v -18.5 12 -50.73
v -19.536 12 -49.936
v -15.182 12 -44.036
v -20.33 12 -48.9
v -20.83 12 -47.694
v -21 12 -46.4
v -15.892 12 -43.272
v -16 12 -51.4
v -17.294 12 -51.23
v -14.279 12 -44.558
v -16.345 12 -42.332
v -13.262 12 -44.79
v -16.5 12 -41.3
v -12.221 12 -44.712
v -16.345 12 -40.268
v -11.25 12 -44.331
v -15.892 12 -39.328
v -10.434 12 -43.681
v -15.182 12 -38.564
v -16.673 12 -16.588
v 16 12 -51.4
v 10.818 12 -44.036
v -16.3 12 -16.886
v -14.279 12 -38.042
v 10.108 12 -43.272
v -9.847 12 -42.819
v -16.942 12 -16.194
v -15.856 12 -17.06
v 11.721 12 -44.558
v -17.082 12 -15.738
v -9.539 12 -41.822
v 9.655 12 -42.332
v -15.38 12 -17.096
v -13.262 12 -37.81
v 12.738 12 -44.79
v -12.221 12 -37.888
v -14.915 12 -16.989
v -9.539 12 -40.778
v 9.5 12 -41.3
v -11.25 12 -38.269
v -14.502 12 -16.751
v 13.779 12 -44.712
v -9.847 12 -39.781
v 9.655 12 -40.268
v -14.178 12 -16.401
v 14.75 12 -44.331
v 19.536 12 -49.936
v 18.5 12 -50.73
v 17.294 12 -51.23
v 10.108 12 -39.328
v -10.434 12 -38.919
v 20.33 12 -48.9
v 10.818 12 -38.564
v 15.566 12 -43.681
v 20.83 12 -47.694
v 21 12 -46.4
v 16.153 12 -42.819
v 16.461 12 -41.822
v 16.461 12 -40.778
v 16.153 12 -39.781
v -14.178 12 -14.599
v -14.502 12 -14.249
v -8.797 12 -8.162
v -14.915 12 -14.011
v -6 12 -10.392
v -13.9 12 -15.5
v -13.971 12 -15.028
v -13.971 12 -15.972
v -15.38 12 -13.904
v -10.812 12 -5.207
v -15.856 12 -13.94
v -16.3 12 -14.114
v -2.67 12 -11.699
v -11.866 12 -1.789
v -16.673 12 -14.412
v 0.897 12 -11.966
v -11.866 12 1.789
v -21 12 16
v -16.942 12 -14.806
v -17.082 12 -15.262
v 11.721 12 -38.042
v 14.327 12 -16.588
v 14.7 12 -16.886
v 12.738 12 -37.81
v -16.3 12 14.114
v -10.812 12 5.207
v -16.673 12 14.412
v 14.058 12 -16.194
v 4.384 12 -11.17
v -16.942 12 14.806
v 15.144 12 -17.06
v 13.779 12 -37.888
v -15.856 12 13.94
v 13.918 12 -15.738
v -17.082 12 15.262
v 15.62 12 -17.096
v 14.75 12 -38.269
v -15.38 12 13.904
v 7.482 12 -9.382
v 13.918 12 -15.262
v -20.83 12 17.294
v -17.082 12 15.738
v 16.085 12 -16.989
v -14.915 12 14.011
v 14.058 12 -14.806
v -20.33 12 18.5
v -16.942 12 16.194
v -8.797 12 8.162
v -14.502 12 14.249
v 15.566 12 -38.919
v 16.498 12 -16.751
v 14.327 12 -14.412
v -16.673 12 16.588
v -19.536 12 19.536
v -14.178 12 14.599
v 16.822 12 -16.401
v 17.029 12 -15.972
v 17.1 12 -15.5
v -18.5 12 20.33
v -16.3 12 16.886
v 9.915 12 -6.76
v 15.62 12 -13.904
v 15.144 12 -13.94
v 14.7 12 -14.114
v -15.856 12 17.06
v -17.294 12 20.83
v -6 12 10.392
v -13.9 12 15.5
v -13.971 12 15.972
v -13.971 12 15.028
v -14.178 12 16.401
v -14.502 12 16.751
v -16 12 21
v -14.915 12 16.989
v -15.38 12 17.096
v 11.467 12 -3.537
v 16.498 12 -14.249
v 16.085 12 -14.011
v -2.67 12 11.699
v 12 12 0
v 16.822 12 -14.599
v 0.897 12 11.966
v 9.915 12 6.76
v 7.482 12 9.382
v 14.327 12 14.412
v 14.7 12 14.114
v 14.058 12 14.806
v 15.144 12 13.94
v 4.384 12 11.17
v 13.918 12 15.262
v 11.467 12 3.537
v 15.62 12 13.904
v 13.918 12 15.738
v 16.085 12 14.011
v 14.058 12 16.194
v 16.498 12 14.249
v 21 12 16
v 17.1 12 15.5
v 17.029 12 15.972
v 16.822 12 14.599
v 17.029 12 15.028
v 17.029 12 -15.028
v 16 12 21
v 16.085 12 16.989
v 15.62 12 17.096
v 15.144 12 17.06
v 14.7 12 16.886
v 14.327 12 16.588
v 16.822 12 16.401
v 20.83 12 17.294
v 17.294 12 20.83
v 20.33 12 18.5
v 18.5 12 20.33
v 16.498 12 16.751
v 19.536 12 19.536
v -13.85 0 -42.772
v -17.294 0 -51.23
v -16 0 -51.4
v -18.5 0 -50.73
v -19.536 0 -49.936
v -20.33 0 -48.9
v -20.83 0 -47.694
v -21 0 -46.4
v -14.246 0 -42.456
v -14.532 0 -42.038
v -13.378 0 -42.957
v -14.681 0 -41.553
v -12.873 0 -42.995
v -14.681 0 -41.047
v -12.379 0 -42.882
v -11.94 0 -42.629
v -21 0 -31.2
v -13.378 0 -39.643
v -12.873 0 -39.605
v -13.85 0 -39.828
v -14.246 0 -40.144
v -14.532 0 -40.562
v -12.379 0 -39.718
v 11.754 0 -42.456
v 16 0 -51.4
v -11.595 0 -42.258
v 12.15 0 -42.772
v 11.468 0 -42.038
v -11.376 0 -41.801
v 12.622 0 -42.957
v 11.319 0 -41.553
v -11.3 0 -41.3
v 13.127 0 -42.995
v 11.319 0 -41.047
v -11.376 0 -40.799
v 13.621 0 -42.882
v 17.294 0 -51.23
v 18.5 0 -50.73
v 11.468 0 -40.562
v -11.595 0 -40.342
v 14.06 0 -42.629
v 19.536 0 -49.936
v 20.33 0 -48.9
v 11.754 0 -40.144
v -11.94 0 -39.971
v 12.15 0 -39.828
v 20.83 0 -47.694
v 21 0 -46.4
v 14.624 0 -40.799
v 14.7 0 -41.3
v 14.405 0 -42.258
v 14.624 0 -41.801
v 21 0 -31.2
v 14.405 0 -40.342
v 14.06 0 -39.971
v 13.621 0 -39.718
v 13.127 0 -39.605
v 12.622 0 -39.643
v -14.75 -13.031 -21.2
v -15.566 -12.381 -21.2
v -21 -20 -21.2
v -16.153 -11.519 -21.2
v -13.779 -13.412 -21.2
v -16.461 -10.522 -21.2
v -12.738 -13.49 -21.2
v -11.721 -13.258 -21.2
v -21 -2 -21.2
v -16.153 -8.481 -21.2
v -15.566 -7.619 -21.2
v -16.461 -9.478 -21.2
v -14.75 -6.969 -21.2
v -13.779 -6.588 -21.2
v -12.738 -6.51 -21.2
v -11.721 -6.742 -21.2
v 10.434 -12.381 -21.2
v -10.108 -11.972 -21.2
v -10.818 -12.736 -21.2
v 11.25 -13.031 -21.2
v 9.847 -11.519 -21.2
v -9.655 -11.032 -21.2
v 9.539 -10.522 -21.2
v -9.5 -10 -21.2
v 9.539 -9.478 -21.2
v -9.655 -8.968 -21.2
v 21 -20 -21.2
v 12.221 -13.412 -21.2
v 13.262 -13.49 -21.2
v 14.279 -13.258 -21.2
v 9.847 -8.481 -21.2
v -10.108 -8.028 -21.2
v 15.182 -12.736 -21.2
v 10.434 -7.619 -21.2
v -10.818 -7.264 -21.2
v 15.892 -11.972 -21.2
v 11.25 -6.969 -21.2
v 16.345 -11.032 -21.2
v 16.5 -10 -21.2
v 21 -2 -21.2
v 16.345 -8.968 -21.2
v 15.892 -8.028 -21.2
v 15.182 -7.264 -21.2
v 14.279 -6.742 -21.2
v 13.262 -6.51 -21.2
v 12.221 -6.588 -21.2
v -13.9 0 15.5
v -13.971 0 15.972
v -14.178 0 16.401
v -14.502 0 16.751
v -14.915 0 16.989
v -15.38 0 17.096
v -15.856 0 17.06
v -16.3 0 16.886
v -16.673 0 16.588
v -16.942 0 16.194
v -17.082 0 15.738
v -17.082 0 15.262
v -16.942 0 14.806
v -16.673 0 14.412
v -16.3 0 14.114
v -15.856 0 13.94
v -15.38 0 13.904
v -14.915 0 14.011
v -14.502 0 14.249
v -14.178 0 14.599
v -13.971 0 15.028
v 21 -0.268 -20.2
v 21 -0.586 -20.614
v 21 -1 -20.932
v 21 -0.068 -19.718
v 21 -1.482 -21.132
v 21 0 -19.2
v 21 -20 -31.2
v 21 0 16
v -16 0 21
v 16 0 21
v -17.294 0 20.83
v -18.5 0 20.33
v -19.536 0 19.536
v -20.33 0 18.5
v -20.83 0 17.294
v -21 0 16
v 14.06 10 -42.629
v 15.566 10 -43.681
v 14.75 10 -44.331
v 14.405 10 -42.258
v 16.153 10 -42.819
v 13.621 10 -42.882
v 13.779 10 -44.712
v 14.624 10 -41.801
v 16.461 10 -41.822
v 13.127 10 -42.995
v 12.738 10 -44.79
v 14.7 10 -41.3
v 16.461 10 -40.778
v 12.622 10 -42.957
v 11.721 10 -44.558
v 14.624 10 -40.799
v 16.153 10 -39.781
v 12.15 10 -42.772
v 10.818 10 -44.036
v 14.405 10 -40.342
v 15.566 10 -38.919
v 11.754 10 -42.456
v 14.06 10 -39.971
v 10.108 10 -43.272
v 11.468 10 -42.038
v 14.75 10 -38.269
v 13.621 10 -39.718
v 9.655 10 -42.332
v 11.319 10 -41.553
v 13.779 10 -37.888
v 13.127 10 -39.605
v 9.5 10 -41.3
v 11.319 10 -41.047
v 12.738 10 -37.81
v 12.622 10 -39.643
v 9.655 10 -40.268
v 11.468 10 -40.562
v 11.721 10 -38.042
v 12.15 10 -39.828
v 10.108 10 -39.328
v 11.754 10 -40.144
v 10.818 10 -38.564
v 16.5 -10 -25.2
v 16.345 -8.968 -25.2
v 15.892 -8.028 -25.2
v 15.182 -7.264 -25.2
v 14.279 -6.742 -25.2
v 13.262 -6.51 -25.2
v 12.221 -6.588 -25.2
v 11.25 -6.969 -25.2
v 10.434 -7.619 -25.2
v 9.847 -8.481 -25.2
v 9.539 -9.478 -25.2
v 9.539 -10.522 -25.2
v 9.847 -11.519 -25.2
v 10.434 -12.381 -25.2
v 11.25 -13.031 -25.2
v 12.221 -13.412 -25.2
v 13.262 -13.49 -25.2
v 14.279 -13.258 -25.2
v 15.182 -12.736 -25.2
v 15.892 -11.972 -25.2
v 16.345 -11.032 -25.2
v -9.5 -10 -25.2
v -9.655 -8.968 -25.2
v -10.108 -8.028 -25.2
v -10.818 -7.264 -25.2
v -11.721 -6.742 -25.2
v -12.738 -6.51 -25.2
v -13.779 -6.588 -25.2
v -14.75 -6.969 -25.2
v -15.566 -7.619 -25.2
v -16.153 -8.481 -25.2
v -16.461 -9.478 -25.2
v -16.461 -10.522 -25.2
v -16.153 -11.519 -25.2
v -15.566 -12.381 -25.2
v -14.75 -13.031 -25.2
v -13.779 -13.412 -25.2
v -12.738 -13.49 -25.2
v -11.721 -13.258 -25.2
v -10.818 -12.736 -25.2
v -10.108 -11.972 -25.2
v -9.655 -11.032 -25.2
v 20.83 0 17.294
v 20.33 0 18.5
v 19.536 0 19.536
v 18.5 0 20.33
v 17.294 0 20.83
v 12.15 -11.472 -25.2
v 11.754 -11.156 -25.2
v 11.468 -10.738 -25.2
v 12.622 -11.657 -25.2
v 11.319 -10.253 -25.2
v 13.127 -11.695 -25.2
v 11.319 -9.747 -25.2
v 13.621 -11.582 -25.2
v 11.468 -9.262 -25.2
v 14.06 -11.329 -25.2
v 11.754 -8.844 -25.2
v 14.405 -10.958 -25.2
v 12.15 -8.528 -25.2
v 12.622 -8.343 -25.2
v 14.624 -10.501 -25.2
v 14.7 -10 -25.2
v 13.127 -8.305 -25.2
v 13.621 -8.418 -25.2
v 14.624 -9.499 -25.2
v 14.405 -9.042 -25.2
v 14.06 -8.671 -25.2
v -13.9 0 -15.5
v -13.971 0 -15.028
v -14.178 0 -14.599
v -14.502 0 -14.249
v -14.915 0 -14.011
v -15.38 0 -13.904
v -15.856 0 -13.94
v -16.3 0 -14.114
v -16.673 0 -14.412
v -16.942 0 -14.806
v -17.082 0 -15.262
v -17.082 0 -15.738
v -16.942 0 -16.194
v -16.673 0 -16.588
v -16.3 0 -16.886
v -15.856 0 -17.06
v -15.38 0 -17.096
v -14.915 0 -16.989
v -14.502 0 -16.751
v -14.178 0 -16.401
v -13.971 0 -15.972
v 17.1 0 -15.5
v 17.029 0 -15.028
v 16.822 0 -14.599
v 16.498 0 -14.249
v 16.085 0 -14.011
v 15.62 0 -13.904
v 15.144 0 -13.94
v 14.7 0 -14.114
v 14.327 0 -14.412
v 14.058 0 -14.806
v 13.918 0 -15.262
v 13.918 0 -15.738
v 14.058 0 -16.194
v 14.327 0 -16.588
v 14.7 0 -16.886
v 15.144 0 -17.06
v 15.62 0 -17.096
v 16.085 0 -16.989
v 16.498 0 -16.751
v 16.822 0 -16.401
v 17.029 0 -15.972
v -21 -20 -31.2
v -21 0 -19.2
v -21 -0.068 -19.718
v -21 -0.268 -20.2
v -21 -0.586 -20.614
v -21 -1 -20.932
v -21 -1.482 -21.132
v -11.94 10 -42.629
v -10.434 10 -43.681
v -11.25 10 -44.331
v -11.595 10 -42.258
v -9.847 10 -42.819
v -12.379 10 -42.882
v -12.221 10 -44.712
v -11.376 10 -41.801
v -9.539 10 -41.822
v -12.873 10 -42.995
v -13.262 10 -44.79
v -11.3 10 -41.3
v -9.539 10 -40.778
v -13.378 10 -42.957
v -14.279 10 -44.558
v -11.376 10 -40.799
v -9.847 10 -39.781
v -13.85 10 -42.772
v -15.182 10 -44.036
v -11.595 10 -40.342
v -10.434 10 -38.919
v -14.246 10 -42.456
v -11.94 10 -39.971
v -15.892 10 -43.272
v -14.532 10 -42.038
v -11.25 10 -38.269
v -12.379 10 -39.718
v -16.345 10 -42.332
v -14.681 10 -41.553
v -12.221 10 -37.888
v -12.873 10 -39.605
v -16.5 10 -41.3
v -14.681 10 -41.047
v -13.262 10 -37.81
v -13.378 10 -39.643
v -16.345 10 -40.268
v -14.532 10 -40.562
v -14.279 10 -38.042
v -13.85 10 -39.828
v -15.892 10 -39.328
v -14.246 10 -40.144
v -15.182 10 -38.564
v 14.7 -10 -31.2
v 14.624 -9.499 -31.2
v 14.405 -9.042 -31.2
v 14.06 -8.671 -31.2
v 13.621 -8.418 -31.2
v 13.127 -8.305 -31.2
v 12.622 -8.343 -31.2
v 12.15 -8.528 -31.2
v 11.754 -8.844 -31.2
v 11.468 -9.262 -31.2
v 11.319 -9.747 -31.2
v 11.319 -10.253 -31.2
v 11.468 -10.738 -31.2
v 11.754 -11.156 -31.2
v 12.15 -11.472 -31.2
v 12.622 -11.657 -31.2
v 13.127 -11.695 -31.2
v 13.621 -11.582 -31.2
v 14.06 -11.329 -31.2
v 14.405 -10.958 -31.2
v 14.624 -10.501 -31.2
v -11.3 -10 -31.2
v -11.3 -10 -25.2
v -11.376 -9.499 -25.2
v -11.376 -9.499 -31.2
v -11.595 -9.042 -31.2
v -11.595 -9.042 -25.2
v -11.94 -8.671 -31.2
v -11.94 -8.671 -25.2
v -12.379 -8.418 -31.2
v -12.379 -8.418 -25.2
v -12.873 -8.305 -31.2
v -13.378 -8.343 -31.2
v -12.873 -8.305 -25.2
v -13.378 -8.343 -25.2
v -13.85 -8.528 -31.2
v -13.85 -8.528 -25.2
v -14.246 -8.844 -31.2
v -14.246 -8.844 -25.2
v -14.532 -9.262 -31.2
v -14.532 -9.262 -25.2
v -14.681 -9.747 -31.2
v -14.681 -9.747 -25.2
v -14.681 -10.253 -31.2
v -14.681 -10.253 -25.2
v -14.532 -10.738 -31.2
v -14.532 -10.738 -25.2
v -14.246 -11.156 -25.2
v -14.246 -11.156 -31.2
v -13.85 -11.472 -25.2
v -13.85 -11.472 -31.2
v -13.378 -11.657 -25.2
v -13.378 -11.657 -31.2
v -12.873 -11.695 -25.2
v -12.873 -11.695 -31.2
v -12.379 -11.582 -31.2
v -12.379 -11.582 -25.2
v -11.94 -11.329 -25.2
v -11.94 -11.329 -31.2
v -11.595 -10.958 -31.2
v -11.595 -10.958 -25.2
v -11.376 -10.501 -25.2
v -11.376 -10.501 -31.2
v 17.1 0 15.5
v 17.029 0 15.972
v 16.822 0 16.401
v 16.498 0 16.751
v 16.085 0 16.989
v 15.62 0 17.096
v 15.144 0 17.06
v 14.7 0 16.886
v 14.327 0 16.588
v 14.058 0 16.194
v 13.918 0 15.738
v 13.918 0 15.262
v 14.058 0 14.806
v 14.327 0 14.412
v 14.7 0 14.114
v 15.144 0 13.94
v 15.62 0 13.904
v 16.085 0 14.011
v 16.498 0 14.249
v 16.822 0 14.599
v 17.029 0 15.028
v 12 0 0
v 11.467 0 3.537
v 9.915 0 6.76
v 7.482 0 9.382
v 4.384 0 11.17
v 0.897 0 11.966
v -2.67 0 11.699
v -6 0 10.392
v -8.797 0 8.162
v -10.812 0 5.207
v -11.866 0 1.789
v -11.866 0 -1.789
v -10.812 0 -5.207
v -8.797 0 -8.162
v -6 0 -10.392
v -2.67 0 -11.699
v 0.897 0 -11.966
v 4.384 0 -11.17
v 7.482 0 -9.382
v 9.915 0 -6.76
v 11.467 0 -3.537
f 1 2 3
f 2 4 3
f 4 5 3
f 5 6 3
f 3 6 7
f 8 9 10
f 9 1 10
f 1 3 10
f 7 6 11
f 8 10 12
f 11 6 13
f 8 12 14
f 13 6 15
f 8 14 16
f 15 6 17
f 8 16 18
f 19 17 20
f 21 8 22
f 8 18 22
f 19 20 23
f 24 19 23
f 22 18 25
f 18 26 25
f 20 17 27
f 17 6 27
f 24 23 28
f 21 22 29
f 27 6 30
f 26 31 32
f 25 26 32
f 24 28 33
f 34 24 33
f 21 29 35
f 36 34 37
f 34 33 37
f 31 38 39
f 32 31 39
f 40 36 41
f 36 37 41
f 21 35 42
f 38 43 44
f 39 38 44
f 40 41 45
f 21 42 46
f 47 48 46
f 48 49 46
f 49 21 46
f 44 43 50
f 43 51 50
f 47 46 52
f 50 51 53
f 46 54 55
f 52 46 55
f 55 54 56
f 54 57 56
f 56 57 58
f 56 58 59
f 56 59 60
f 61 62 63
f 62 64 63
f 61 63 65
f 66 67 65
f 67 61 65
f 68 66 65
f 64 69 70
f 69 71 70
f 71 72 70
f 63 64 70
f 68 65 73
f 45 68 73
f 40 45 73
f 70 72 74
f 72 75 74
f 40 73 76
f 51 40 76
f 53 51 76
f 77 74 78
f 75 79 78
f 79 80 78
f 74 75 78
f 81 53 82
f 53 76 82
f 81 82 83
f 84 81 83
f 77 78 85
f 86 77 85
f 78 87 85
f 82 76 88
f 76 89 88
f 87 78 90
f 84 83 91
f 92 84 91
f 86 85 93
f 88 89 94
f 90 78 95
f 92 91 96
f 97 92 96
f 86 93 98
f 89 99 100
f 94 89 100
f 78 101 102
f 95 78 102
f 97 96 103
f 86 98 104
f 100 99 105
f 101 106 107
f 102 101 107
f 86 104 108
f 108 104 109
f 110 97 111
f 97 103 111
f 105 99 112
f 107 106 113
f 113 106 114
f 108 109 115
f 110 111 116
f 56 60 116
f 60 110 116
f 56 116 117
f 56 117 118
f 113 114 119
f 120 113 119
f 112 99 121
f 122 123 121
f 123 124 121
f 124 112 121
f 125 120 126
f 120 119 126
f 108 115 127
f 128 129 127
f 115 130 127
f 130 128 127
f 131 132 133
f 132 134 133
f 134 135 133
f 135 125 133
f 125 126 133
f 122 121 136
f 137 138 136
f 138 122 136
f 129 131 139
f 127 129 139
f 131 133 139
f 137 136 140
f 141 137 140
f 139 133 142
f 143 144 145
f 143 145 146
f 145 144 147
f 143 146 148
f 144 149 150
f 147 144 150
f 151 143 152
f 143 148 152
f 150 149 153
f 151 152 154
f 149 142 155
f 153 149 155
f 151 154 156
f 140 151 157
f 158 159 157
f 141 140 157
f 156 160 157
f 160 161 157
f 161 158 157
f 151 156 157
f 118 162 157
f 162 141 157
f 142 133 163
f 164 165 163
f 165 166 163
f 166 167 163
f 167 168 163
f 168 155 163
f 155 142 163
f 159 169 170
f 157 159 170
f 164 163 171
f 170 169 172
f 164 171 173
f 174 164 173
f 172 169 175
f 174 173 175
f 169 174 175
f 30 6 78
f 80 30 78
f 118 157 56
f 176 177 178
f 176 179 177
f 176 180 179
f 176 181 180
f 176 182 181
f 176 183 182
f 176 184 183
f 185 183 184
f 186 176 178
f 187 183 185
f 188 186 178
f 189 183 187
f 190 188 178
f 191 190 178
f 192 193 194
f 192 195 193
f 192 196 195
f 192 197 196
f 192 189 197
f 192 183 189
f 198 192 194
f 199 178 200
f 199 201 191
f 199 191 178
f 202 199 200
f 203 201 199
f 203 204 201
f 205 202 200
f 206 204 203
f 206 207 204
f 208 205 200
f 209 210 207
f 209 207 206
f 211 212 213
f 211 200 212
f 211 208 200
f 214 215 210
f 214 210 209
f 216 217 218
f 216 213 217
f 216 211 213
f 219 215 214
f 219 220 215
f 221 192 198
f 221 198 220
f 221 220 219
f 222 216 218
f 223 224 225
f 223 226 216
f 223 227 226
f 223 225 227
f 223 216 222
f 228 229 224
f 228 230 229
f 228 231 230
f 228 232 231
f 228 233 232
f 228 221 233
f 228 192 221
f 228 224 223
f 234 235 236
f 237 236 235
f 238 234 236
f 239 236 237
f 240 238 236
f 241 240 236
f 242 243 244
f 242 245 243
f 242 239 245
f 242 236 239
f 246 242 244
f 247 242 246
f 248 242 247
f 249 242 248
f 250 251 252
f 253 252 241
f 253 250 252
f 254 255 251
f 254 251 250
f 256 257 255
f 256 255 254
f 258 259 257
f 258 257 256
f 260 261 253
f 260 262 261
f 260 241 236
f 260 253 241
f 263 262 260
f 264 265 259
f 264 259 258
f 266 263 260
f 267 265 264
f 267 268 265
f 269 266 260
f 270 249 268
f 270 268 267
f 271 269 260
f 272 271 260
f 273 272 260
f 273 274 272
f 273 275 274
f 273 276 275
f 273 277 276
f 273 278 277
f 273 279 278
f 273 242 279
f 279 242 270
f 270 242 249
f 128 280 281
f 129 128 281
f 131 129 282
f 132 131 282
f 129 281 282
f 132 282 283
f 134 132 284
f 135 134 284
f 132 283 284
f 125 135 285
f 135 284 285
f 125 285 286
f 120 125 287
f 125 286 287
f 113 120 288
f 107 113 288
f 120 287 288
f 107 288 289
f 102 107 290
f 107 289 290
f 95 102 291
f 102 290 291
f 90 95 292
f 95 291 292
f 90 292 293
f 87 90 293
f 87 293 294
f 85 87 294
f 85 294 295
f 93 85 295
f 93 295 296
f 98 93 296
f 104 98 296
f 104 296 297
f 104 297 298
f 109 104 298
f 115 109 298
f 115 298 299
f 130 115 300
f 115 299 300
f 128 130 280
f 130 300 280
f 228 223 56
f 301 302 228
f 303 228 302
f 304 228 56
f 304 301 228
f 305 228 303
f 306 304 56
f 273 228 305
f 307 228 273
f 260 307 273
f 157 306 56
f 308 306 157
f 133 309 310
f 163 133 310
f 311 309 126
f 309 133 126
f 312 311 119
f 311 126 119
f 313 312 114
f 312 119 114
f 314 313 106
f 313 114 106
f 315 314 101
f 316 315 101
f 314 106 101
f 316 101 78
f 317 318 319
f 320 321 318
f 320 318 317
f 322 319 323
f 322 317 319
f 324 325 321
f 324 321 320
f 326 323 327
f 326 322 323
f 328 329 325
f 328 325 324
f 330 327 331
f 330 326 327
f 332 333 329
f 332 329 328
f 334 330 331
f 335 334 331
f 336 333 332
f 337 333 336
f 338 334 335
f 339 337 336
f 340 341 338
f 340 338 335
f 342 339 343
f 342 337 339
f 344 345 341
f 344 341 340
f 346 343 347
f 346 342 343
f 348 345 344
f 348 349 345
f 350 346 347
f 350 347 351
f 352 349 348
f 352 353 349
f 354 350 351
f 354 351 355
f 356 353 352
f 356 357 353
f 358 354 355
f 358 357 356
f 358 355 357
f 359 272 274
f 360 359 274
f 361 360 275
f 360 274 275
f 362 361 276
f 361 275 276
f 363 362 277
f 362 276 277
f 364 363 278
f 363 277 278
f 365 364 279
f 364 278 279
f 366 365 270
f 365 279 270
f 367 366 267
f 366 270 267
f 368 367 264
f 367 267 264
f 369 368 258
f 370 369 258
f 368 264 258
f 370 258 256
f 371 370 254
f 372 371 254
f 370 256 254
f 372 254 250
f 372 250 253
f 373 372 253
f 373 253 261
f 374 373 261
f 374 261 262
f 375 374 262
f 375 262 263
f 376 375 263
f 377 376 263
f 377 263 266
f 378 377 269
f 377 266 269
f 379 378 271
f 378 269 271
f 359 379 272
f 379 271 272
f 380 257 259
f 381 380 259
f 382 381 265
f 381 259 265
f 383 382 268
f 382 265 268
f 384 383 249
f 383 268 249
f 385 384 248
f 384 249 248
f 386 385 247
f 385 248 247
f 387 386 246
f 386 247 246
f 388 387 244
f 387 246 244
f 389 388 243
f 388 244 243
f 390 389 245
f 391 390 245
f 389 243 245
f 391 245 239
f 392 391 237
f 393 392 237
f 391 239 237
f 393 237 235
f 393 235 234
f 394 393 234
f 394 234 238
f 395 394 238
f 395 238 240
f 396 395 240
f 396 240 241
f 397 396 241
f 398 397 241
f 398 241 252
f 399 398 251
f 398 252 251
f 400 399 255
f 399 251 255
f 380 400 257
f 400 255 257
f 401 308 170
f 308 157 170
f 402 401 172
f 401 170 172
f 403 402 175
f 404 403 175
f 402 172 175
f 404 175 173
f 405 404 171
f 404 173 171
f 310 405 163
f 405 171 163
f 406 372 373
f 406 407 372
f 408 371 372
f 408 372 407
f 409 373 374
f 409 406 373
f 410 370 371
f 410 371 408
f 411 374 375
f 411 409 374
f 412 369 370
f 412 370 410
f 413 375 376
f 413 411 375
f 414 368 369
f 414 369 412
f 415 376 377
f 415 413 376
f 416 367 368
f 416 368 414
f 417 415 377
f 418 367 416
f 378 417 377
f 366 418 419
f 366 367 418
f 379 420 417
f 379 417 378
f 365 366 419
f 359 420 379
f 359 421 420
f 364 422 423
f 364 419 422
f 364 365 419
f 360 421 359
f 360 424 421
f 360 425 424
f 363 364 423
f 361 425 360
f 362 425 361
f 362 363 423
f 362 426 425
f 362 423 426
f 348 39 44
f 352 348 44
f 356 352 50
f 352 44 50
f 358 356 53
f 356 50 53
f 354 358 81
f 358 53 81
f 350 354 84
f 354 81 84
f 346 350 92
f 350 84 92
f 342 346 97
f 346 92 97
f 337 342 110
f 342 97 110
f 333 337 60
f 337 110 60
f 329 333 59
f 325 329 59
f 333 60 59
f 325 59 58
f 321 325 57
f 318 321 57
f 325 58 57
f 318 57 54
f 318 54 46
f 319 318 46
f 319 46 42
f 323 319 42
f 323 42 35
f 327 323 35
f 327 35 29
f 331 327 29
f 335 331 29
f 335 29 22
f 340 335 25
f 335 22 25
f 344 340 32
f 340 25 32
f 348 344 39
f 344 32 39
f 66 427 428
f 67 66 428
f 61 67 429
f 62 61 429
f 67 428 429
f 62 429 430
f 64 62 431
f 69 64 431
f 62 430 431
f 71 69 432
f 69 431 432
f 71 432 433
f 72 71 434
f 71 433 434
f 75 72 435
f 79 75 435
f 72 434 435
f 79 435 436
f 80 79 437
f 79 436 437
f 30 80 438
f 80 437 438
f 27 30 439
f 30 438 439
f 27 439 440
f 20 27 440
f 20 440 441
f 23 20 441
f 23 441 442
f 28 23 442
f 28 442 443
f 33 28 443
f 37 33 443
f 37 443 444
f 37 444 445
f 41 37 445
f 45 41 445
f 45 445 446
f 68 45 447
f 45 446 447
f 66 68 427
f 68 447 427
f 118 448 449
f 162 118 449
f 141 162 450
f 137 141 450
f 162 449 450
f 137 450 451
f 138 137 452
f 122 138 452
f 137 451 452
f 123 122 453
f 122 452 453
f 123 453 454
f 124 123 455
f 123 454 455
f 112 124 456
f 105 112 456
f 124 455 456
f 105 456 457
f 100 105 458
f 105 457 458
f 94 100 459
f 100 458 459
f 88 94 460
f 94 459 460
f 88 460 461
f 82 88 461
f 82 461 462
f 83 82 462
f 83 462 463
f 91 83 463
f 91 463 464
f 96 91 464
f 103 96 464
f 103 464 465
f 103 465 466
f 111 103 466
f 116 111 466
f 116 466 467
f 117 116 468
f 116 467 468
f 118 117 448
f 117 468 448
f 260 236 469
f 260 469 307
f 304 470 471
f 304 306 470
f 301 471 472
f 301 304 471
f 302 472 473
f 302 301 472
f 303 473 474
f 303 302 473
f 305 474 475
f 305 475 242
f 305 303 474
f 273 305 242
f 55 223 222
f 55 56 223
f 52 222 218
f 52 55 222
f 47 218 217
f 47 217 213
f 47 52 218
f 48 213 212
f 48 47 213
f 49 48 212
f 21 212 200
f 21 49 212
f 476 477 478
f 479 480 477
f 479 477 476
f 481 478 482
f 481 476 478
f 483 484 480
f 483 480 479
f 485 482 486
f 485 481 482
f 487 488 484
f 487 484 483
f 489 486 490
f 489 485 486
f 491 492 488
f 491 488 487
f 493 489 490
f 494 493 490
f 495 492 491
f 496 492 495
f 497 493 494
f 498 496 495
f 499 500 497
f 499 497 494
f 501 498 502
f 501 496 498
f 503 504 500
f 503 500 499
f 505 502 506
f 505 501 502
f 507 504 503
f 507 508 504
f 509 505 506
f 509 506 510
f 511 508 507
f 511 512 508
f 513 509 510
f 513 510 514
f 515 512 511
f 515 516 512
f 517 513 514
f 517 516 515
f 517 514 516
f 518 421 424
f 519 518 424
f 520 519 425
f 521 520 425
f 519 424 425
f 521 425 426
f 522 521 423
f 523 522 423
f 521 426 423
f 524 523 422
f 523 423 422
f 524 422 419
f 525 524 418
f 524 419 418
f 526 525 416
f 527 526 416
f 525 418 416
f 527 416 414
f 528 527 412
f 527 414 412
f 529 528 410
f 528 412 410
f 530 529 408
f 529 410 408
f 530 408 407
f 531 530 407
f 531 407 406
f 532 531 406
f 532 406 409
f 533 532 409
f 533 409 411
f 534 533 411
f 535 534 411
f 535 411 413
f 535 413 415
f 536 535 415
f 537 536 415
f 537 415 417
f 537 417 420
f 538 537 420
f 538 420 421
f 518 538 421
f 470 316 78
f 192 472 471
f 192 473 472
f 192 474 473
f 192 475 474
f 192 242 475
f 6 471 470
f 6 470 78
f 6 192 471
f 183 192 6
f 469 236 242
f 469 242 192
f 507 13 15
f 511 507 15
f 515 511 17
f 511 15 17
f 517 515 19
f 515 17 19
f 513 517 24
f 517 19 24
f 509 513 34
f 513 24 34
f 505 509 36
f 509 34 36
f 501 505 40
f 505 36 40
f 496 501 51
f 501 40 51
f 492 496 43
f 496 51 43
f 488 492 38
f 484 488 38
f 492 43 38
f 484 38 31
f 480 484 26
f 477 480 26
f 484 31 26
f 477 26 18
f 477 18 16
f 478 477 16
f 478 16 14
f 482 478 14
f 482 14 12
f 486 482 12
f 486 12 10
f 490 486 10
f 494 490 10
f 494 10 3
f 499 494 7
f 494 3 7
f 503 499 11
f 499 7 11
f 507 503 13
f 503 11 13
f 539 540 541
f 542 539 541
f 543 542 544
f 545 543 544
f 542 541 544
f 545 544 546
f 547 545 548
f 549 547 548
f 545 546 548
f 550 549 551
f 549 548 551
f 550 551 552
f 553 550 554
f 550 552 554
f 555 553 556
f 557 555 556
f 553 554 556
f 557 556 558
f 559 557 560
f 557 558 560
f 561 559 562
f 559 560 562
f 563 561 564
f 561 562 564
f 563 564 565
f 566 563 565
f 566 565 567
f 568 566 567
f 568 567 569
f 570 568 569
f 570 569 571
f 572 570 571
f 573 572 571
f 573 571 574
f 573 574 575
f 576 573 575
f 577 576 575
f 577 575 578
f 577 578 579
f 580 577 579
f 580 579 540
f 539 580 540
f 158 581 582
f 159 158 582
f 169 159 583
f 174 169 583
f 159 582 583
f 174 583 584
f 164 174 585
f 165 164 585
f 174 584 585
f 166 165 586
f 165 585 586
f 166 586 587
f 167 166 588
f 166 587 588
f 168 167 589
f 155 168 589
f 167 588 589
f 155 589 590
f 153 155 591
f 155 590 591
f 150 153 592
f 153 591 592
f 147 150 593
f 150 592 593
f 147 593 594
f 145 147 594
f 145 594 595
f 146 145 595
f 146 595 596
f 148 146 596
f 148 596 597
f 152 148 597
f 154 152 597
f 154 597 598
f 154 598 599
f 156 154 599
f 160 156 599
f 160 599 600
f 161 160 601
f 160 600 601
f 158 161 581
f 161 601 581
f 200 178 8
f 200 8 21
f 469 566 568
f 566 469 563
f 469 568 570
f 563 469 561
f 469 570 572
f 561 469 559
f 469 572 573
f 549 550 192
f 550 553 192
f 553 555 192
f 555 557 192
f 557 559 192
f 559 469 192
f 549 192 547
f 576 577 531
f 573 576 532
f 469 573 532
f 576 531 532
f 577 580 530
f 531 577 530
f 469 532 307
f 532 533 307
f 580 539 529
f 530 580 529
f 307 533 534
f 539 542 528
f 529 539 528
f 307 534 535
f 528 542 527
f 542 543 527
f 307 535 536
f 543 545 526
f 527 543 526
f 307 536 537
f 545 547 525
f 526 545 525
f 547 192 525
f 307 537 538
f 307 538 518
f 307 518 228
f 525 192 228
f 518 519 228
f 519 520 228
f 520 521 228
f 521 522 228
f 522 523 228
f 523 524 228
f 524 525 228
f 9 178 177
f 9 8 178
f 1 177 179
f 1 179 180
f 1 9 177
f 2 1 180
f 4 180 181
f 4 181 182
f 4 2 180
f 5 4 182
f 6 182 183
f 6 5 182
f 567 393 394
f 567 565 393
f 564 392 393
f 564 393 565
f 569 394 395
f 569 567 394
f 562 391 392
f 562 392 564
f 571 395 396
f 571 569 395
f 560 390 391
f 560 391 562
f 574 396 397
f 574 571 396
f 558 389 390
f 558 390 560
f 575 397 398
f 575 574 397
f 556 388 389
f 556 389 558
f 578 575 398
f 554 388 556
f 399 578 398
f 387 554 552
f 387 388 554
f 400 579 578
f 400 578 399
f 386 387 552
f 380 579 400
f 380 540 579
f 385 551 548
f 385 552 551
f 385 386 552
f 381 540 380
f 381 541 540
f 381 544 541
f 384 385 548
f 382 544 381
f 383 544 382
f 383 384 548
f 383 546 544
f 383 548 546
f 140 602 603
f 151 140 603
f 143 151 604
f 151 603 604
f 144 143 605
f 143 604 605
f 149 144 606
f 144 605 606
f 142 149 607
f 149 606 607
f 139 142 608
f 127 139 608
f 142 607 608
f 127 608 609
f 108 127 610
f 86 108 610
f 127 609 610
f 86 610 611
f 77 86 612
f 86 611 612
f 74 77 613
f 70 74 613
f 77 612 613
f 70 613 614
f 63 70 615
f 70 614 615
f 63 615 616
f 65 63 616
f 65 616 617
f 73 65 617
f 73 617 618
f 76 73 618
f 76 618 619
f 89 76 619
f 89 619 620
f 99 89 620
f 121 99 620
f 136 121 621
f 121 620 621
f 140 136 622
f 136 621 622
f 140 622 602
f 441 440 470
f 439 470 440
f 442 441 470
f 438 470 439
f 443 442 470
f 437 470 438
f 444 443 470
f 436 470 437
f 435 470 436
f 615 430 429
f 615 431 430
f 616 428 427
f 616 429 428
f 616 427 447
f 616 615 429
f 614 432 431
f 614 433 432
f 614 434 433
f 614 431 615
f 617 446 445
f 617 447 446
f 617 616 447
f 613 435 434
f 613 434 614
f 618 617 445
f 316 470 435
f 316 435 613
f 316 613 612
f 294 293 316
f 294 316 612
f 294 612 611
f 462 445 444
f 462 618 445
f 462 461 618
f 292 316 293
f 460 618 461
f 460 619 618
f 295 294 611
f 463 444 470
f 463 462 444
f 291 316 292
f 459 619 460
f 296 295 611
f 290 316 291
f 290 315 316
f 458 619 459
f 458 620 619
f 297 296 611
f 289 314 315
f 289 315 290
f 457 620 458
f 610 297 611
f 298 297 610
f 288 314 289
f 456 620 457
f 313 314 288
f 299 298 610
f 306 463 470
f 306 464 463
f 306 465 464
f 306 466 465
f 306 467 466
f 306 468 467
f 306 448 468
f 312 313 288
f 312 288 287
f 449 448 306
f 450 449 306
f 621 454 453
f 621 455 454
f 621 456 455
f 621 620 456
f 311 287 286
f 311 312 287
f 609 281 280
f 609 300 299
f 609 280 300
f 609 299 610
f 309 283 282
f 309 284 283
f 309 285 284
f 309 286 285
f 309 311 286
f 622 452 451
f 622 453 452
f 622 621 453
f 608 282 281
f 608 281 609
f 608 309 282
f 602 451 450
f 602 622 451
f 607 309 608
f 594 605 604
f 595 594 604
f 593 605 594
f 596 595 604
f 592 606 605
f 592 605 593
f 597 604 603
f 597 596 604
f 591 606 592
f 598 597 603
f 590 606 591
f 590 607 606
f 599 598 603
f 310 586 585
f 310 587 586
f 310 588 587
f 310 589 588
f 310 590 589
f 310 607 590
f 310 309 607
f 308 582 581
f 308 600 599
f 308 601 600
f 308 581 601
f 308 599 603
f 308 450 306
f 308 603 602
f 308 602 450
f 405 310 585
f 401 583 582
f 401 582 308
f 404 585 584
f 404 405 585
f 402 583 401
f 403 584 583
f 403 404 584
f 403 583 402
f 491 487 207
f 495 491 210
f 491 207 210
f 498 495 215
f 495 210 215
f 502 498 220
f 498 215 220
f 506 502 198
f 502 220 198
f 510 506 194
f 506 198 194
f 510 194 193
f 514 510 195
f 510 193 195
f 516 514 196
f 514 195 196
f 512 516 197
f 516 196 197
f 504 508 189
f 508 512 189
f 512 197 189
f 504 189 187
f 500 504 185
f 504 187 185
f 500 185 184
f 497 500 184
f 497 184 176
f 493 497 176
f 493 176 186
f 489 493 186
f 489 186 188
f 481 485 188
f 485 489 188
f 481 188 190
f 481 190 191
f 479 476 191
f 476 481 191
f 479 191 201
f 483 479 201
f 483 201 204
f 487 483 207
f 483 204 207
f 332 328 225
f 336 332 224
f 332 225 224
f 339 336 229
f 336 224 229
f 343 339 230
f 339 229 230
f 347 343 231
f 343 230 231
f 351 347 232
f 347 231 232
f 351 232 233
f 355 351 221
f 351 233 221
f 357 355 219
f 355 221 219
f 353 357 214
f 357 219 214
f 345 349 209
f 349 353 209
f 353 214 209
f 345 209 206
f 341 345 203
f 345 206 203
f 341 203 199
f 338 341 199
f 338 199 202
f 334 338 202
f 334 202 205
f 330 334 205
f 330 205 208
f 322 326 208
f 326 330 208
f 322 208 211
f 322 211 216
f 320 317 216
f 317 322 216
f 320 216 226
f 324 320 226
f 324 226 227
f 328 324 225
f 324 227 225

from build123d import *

# Parameters (mm, degrees)
F0_W     = 42
F0_H     = 10
F1_DEPTH = 20
F0_H_2   = 42
F0_R     = 1.6
F0_R_2   = 12
F0_H_3   = 20.2
F0_R_3   = 3.5
F0_H_4   = 0.1999993771
F2_DEPTH = 12
F3_R     = 1.7
F4_DEPTH = 25
F3_R_2   = 3.5
F5_DEPTH = 4
F0_R_4   = 1.7
F6_DEPTH = 12
F7_R     = 3.5
F7_R_2   = 1.7
F8_DEPTH = 2
F9_R     = 5
F10_R    = 2


# Not quite as in the source:
# - a feature names something its author has since deleted; it is built from what else it names


with BuildPart() as f1:
    # F0 (on Front) → F1 (new body)
    with BuildSketch(Plane.XZ):
        with Locations((0, -26.1999993771)):
            Rectangle(F0_W, F0_H)
    extrude(amount=F1_DEPTH)

    # F0 (on Front) → F2 (join)
    with BuildSketch(Plane.XZ):
        Rectangle(F0_W, F0_H_2)
        with Locations((-15.5, -15.5)):
            Circle(F0_R, mode=Mode.SUBTRACT)
        with Locations((15.5, -15.5)):
            Circle(F0_R, mode=Mode.SUBTRACT)
        with Locations((-15.5, 15.5)):
            Circle(F0_R, mode=Mode.SUBTRACT)
        Circle(F0_R_2, mode=Mode.SUBTRACT)
        with Locations((15.5, 15.5)):
            Circle(F0_R, mode=Mode.SUBTRACT)
        with Locations((0, -26.1999993771)):
            Rectangle(F0_W, F0_H)
        with Locations((0, -41.2999993771)):
            Rectangle(F0_W, F0_H_3)
        with Locations((-13, -41.2999993771)):
            Circle(F0_R_3, mode=Mode.SUBTRACT)
        with Locations((13, -41.2999993771)):
            Circle(F0_R_3, mode=Mode.SUBTRACT)
        with Locations((0, -21.0999996886)):
            Rectangle(F0_W, F0_H_4)
    extrude(amount=-F2_DEPTH)

    # F3 (on face) → F4 (cut)
    with BuildSketch(Plane.XY.offset(-21.1999993771)):
        with Locations((-13, -10)):
            Circle(F3_R)
        with Locations((13, -10)):
            Circle(F3_R)
    extrude(amount=-F4_DEPTH, mode=Mode.SUBTRACT)

    # F3 (on face) → F5 (cut)
    with BuildSketch(Plane.XY.offset(-21.1999993771)):
        with Locations((-13, -10)):
            Circle(F3_R_2)
        with Locations((-13, -10)):
            Circle(F3_R, mode=Mode.SUBTRACT)
        with Locations((13, -10)):
            Circle(F3_R_2)
        with Locations((13, -10)):
            Circle(F3_R, mode=Mode.SUBTRACT)
    extrude(amount=-F5_DEPTH, mode=Mode.SUBTRACT)

    # F0 (on Front) → F6 (join)
    with BuildSketch(Plane.XZ):
        with Locations((13, -41.2999993771)):
            Circle(F0_R_3)
        with Locations((13, -41.2999993771)):
            Circle(F0_R_4, mode=Mode.SUBTRACT)
        with Locations((-13, -41.2999993771)):
            Circle(F0_R_3)
        with Locations((-13, -41.2999993771)):
            Circle(F0_R_4, mode=Mode.SUBTRACT)
    extrude(amount=-F6_DEPTH)

    # F7 (on face) → F8 (cut)
    with BuildSketch(Plane(origin=(0, 12, 0), x_dir=(-1, 0, 0), z_dir=(0, 1, 0))):
        with Locations((-13, -41.2999993771)):
            Circle(F7_R)
        with Locations((-13, -41.2999993771)):
            Circle(F7_R_2, mode=Mode.SUBTRACT)
        with Locations((13, -41.2999993771)):
            Circle(F7_R)
        with Locations((13, -41.2999993771)):
            Circle(F7_R_2, mode=Mode.SUBTRACT)
    extrude(amount=-F8_DEPTH, mode=Mode.SUBTRACT)

    # F9
    f9_edges = [f1.edges().sort_by_distance(p)[0] for p in [
        (21, 6, 21),
        (-21, 6, 21),
        (-21, 6, -51.399999),
        (21, 6, -51.399999),
    ]]
    fillet(f9_edges, radius=F9_R)

    # F10
    f10_edges = [f1.edges().sort_by_distance(p)[0] for p in [
        (0, 0, -21.199999),
    ]]
    fillet(f10_edges, radius=F10_R)


solid = f1.part
